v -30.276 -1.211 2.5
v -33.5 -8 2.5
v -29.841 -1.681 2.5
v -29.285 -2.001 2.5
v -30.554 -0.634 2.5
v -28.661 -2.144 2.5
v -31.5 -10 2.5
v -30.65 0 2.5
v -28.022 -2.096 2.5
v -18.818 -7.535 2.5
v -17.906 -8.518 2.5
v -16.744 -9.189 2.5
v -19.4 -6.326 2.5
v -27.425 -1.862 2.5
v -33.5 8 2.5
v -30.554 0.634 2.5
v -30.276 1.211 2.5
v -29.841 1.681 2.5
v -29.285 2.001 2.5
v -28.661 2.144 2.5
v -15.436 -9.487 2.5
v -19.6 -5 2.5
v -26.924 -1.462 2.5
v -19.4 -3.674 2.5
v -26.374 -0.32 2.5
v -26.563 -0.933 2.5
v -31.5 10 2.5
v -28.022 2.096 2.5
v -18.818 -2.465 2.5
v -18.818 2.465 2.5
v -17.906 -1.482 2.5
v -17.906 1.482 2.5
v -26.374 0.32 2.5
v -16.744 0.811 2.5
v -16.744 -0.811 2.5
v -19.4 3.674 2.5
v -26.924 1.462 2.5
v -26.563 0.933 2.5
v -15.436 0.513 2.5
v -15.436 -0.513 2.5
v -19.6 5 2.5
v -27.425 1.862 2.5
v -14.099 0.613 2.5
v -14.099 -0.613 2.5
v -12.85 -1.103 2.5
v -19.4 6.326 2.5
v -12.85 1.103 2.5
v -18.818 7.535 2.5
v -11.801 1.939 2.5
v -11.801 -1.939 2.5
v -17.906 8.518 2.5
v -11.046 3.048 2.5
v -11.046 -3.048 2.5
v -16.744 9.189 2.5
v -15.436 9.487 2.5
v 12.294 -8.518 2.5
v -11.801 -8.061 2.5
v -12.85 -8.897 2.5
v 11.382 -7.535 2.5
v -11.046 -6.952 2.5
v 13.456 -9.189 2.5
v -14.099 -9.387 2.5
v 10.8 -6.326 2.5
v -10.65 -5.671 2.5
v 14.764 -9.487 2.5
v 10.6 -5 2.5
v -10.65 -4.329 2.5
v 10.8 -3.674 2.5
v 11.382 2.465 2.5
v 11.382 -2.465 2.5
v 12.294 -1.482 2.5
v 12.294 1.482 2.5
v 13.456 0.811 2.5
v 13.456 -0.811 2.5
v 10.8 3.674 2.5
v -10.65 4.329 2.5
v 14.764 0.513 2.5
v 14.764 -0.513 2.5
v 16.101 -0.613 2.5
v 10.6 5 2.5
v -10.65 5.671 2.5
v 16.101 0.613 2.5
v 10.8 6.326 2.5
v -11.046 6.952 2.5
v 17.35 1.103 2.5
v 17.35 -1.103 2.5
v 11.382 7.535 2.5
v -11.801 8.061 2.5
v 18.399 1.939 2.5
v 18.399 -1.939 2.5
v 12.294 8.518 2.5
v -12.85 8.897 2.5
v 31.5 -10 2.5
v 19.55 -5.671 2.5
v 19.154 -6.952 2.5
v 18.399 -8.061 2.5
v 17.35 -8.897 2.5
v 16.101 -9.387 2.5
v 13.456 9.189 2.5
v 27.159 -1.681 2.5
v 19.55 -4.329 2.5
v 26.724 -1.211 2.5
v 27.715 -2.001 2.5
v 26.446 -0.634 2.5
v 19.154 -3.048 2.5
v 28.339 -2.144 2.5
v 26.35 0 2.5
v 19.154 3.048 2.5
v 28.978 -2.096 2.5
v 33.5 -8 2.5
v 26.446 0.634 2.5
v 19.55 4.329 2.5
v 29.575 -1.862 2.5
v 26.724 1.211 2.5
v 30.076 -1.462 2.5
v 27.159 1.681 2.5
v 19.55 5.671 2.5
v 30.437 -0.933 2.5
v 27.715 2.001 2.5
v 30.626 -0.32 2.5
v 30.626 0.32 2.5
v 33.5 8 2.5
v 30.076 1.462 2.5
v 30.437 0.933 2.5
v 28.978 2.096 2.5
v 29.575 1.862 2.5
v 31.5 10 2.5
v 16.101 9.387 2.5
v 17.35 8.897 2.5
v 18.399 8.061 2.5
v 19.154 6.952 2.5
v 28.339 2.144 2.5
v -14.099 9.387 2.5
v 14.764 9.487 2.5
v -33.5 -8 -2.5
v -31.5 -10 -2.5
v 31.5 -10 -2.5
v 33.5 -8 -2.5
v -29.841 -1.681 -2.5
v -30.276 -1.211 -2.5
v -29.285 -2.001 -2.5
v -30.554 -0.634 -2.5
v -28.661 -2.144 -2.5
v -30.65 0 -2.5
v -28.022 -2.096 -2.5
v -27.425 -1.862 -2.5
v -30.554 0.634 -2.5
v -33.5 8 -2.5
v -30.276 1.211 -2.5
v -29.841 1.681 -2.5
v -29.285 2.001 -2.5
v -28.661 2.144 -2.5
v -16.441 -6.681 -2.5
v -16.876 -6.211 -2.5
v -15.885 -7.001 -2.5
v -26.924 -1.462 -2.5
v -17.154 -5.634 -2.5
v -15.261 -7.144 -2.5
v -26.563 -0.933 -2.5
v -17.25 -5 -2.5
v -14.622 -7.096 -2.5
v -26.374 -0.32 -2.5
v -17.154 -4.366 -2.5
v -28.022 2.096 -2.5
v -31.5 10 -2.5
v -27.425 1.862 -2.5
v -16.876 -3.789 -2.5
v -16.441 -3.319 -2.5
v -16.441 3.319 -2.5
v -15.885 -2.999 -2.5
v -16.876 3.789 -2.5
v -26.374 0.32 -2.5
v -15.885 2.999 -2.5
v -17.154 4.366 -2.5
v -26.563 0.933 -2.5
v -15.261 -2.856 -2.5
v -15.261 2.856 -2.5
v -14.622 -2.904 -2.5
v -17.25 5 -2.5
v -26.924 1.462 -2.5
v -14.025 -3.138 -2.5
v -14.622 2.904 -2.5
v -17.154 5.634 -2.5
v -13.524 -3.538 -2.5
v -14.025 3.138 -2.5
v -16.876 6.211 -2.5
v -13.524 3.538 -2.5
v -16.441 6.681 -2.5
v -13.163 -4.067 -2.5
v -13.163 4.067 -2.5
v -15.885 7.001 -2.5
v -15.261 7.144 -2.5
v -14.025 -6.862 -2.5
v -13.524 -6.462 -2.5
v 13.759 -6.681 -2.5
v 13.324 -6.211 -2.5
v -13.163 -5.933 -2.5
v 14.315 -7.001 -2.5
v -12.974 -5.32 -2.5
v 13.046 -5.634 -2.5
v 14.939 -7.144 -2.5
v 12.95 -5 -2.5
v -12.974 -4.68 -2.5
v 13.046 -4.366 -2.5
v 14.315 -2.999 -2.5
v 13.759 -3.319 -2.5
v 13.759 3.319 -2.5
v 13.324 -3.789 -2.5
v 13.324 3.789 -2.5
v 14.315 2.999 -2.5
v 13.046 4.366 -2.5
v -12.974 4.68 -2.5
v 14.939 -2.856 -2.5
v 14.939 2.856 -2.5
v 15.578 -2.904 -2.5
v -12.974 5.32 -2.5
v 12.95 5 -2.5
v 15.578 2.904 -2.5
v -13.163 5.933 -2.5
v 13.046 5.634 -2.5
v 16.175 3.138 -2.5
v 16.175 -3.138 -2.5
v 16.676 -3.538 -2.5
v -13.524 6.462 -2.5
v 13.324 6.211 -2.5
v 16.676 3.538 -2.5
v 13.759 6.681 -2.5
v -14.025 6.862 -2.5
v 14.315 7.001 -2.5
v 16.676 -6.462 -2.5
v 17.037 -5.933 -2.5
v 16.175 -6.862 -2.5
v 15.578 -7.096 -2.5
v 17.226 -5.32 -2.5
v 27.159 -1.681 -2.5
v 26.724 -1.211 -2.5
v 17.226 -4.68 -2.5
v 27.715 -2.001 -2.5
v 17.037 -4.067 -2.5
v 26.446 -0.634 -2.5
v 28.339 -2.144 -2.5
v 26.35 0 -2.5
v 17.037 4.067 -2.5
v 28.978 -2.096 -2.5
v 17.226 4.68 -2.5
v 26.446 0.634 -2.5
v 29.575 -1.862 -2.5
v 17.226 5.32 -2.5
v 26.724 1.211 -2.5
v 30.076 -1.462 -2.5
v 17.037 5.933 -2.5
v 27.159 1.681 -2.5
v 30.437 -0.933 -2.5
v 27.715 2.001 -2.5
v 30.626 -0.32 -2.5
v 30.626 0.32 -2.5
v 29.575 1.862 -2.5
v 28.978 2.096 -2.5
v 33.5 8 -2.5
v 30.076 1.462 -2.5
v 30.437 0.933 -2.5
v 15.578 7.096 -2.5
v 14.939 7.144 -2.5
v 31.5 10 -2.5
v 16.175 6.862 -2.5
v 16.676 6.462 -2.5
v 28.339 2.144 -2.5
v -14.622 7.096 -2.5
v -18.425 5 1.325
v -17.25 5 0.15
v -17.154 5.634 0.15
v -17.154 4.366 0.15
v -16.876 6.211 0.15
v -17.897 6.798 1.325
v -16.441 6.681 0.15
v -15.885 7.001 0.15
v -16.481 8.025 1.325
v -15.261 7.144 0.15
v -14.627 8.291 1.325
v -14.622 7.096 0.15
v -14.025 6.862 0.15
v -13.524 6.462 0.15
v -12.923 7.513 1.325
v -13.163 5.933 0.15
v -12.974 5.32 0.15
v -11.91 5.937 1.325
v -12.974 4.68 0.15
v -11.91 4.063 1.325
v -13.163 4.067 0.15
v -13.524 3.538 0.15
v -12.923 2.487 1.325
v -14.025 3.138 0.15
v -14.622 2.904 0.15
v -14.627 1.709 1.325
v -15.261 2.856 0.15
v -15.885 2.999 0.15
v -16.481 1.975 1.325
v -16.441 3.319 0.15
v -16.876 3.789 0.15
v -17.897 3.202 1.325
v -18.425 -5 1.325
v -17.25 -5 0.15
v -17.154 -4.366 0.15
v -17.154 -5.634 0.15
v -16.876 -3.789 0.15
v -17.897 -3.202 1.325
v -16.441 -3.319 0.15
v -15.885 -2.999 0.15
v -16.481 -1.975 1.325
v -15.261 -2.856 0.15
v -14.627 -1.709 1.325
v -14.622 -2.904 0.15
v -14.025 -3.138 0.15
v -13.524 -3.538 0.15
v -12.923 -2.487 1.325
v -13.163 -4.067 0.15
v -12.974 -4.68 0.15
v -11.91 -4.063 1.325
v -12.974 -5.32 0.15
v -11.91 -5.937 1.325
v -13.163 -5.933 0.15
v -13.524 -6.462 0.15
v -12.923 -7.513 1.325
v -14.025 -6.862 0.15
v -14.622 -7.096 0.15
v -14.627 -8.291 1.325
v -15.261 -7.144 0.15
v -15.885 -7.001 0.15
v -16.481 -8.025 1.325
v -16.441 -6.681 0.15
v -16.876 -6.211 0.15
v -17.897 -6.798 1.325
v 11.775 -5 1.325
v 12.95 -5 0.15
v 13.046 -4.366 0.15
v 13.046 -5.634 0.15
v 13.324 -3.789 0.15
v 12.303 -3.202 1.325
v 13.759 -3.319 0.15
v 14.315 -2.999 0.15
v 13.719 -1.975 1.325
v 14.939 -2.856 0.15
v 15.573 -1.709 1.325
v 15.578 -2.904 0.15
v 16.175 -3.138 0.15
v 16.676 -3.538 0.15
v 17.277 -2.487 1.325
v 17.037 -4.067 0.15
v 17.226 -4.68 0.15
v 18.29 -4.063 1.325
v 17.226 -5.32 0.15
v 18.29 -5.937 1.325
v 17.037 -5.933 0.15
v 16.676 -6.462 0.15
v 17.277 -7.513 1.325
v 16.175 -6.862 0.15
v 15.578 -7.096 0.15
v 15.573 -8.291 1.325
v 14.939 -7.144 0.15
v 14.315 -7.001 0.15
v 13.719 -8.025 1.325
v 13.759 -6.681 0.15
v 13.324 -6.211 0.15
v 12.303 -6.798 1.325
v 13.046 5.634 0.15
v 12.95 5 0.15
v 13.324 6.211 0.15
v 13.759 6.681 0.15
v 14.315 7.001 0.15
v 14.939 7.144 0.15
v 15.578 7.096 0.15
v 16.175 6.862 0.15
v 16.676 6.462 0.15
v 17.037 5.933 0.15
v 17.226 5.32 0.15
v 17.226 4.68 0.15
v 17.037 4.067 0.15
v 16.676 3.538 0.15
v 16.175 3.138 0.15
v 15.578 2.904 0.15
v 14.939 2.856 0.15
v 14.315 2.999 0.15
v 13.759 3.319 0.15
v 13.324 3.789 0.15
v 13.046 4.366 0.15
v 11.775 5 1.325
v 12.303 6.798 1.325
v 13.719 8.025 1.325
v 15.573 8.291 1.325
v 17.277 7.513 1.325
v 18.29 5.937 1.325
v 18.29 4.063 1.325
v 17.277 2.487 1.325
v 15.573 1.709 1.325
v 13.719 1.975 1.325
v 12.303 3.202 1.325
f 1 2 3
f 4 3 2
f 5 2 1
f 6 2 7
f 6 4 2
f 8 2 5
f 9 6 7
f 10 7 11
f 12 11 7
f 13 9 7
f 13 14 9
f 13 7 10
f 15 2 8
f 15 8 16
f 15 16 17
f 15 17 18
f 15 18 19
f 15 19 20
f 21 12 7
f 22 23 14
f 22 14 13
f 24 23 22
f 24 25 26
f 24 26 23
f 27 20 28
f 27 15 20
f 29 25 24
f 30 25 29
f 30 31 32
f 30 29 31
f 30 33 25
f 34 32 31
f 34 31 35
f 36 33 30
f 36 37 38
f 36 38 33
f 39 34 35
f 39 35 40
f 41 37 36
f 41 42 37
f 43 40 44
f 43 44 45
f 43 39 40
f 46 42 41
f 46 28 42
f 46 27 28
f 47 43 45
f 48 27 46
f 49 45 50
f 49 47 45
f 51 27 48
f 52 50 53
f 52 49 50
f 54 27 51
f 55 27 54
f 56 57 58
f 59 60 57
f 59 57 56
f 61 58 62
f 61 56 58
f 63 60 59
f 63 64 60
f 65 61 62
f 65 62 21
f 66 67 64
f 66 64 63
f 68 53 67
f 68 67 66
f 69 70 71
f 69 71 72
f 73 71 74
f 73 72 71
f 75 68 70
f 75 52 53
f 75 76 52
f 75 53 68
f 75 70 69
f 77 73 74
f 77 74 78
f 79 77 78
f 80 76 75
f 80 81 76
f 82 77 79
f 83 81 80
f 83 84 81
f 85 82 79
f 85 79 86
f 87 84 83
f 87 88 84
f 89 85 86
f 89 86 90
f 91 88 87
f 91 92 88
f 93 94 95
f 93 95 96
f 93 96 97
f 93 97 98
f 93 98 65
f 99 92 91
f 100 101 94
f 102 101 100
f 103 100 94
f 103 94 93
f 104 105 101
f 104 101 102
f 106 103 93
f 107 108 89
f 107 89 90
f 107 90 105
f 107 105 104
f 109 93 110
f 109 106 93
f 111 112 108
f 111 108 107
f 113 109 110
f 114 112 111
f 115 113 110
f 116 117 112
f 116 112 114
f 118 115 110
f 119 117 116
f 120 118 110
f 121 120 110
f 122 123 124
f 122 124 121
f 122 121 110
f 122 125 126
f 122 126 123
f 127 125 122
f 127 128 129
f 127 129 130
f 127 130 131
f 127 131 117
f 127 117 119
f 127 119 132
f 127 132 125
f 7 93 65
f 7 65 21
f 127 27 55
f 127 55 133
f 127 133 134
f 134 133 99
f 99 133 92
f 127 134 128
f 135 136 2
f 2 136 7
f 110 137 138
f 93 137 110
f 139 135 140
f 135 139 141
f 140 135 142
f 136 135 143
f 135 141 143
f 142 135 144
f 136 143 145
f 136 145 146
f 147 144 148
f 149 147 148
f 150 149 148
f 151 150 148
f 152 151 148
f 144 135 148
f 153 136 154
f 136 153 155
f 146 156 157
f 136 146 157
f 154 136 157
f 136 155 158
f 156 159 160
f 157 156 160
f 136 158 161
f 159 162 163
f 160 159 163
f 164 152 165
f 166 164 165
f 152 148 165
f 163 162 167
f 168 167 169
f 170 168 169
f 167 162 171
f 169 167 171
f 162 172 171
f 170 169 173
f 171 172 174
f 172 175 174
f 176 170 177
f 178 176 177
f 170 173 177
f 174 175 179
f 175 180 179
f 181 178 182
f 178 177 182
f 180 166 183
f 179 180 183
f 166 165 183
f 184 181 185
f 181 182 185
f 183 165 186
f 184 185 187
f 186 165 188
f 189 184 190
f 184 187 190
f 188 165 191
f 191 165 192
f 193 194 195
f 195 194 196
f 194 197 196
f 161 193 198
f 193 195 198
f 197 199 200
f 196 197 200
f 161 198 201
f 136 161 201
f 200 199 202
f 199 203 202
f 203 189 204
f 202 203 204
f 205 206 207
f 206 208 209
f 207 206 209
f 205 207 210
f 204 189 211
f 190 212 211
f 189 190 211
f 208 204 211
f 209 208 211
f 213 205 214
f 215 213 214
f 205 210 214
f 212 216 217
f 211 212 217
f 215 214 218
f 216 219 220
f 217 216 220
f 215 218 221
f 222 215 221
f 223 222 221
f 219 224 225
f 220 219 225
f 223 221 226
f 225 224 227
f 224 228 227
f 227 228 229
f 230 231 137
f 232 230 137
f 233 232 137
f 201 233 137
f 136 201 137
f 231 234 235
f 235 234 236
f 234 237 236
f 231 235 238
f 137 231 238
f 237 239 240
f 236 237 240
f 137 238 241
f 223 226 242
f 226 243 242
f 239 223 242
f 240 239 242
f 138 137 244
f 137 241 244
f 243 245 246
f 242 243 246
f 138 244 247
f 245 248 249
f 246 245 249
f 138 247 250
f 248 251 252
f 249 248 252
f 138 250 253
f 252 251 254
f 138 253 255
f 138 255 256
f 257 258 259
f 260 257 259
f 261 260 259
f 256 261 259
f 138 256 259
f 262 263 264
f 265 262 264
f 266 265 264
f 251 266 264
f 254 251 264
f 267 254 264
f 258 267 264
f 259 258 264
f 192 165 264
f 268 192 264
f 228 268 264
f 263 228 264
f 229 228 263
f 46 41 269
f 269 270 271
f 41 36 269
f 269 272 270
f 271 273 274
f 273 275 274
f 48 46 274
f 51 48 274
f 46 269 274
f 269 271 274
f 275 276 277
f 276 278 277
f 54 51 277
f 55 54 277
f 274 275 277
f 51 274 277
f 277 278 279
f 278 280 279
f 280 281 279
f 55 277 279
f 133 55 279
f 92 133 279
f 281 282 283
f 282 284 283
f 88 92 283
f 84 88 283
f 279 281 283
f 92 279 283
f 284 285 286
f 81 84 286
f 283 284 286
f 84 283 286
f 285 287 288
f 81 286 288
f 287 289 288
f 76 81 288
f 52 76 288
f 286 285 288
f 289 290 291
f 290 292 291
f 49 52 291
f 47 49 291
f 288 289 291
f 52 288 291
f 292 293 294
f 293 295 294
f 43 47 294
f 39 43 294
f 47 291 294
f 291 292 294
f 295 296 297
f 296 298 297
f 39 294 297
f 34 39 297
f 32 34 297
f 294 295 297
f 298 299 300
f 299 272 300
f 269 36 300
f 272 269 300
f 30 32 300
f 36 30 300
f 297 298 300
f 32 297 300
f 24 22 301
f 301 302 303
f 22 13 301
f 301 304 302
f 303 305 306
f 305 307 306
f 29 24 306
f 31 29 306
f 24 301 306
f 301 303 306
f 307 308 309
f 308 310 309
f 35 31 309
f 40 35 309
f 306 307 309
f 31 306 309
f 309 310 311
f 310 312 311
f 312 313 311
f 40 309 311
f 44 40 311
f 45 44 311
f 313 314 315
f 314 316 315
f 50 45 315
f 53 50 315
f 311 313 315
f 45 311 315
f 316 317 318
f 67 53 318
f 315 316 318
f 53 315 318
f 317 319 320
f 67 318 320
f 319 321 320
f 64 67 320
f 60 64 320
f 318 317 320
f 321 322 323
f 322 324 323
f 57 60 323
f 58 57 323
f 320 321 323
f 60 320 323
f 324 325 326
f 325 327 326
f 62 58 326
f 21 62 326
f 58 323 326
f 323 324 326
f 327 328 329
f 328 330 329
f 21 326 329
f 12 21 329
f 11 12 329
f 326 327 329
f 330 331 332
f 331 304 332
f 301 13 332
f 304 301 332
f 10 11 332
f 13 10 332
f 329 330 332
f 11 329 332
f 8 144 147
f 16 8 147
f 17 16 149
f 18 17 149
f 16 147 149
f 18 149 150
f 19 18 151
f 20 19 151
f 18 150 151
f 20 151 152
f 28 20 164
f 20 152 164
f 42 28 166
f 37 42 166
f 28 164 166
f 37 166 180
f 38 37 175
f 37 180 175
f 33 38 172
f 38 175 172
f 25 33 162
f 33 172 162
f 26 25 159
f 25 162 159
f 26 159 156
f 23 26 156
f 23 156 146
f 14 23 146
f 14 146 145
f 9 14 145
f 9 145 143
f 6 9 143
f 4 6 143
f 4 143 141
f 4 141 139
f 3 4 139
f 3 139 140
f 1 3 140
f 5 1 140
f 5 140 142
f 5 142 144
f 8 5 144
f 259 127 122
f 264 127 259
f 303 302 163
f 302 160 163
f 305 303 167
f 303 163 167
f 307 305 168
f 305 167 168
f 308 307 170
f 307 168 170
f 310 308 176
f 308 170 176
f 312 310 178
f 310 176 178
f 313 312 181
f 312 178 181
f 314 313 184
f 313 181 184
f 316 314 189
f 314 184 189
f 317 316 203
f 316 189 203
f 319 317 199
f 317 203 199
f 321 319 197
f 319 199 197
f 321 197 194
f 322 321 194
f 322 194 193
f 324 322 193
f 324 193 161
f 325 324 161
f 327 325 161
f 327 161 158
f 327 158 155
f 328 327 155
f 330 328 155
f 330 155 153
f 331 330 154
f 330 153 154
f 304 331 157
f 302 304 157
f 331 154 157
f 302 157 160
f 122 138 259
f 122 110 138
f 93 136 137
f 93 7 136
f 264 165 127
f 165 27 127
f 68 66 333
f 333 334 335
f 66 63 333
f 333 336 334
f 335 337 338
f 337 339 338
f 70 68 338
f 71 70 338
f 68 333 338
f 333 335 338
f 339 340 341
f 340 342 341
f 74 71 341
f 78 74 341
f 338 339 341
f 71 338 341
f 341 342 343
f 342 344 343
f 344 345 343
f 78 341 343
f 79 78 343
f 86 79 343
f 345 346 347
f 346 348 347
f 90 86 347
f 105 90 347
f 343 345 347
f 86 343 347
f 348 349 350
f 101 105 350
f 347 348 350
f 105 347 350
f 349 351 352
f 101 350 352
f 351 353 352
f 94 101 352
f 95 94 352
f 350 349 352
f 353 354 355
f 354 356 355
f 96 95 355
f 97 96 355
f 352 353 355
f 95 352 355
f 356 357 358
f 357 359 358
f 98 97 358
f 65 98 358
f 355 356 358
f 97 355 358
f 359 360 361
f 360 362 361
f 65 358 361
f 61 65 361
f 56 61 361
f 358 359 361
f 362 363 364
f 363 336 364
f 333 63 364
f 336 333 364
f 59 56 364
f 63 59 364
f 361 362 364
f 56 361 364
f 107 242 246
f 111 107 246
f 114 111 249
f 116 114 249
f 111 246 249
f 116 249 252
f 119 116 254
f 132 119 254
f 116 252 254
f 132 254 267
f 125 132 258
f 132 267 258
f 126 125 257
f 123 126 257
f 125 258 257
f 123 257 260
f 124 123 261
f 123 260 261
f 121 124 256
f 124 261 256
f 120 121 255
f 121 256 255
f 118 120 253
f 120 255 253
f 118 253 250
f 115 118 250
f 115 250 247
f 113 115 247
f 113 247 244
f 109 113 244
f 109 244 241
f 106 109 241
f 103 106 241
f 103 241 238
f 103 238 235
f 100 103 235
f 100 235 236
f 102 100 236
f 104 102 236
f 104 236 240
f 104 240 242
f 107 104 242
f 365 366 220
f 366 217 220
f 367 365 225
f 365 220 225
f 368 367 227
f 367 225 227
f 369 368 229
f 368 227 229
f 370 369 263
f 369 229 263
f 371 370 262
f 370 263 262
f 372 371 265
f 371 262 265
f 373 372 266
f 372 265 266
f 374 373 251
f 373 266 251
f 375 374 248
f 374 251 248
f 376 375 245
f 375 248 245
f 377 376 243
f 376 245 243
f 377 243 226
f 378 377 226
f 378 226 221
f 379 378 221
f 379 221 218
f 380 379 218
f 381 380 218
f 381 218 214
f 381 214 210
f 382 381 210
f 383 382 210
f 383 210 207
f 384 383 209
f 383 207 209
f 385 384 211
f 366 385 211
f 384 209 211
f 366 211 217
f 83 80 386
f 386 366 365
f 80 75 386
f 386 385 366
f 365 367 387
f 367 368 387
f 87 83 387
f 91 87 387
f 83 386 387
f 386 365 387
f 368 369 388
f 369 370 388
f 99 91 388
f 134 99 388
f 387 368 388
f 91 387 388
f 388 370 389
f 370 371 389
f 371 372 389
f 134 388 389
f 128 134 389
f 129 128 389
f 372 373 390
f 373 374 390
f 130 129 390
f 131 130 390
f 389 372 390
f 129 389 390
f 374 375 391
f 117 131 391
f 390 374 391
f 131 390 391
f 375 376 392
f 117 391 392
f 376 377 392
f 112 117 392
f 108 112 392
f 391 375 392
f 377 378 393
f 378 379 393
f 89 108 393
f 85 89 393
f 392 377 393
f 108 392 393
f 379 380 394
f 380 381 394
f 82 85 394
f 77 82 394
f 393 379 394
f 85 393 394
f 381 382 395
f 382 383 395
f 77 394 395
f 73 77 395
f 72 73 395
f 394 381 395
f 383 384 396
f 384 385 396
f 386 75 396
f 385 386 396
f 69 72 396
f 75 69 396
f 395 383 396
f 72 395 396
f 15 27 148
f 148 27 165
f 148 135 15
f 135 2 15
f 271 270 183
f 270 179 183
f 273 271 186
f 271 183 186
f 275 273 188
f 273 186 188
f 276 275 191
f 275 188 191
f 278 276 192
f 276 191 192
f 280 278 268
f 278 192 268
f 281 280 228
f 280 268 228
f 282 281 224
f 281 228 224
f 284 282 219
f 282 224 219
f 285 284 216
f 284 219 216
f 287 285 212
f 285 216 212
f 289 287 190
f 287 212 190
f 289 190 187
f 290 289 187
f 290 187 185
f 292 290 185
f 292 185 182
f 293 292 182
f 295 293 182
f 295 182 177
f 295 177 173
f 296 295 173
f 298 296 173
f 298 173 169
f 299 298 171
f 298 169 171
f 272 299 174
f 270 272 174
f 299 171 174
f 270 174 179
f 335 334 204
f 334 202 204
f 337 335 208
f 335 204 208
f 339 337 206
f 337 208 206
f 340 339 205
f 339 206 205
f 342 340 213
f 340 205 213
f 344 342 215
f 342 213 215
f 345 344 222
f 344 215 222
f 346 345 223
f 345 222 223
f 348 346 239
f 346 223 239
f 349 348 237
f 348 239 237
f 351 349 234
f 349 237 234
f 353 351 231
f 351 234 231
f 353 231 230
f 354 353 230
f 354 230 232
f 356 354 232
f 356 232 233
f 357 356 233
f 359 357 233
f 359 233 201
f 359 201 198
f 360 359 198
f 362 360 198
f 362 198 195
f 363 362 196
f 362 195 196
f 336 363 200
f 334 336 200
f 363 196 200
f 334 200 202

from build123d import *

# Parameters (mm, degrees)
SKETCH1_W                                            = 67
SKETCH1_H                                            = 20
BOSS_EXTRUDE1_DEPTH                                  = 2.5
M4_CLEARANCE_HOLE1_D                                 = 4.3
CSK_FOR_M4_HEX_SOCKET_COUNTERSUNK_CAP_SC_D           = 4.3
CSK_FOR_M4_HEX_SOCKET_COUNTERSUNK_CAP_SC_CSINK_D     = 9
CSK_FOR_M4_HEX_SOCKET_COUNTERSUNK_CAP_SC_CSINK_ANGLE = 90
CHAMFER1_SIZE                                        = 2


with BuildPart() as part:
    # Sketch1 → Boss-Extrude1 (new, symmetric)
    with BuildSketch(Plane.XY):
        Rectangle(SKETCH1_W, SKETCH1_H)
    extrude(amount=BOSS_EXTRUDE1_DEPTH, both=True)

    # M4 Clearance Hole1 (through all)
    with Locations(Plane.XY.offset(2.5)):
        with Locations((-28.5, 0), (28.5, 0)):
            Hole(M4_CLEARANCE_HOLE1_D / 2)

    # CSK for M4 Hex Socket Countersunk Cap Screw1 (through all)
    with Locations(Plane.XY.offset(2.5)):
        with Locations((-15.1, -5), (-15.1, 5), (15.1, 5), (15.1, -5)):
            CounterSinkHole(CSK_FOR_M4_HEX_SOCKET_COUNTERSUNK_CAP_SC_D / 2, CSK_FOR_M4_HEX_SOCKET_COUNTERSUNK_CAP_SC_CSINK_D / 2, counter_sink_angle=CSK_FOR_M4_HEX_SOCKET_COUNTERSUNK_CAP_SC_CSINK_ANGLE)

    # Chamfer1
    chamfer1_edges = [part.edges().sort_by_distance(p)[0] for p in [
        (-33.5, 10, 0),
        (33.5, 10, 0),
        (33.5, -10, 0),
        (-33.5, -10, 0),
    ]]
    chamfer(chamfer1_edges, length=CHAMFER1_SIZE)


solid = part.part
